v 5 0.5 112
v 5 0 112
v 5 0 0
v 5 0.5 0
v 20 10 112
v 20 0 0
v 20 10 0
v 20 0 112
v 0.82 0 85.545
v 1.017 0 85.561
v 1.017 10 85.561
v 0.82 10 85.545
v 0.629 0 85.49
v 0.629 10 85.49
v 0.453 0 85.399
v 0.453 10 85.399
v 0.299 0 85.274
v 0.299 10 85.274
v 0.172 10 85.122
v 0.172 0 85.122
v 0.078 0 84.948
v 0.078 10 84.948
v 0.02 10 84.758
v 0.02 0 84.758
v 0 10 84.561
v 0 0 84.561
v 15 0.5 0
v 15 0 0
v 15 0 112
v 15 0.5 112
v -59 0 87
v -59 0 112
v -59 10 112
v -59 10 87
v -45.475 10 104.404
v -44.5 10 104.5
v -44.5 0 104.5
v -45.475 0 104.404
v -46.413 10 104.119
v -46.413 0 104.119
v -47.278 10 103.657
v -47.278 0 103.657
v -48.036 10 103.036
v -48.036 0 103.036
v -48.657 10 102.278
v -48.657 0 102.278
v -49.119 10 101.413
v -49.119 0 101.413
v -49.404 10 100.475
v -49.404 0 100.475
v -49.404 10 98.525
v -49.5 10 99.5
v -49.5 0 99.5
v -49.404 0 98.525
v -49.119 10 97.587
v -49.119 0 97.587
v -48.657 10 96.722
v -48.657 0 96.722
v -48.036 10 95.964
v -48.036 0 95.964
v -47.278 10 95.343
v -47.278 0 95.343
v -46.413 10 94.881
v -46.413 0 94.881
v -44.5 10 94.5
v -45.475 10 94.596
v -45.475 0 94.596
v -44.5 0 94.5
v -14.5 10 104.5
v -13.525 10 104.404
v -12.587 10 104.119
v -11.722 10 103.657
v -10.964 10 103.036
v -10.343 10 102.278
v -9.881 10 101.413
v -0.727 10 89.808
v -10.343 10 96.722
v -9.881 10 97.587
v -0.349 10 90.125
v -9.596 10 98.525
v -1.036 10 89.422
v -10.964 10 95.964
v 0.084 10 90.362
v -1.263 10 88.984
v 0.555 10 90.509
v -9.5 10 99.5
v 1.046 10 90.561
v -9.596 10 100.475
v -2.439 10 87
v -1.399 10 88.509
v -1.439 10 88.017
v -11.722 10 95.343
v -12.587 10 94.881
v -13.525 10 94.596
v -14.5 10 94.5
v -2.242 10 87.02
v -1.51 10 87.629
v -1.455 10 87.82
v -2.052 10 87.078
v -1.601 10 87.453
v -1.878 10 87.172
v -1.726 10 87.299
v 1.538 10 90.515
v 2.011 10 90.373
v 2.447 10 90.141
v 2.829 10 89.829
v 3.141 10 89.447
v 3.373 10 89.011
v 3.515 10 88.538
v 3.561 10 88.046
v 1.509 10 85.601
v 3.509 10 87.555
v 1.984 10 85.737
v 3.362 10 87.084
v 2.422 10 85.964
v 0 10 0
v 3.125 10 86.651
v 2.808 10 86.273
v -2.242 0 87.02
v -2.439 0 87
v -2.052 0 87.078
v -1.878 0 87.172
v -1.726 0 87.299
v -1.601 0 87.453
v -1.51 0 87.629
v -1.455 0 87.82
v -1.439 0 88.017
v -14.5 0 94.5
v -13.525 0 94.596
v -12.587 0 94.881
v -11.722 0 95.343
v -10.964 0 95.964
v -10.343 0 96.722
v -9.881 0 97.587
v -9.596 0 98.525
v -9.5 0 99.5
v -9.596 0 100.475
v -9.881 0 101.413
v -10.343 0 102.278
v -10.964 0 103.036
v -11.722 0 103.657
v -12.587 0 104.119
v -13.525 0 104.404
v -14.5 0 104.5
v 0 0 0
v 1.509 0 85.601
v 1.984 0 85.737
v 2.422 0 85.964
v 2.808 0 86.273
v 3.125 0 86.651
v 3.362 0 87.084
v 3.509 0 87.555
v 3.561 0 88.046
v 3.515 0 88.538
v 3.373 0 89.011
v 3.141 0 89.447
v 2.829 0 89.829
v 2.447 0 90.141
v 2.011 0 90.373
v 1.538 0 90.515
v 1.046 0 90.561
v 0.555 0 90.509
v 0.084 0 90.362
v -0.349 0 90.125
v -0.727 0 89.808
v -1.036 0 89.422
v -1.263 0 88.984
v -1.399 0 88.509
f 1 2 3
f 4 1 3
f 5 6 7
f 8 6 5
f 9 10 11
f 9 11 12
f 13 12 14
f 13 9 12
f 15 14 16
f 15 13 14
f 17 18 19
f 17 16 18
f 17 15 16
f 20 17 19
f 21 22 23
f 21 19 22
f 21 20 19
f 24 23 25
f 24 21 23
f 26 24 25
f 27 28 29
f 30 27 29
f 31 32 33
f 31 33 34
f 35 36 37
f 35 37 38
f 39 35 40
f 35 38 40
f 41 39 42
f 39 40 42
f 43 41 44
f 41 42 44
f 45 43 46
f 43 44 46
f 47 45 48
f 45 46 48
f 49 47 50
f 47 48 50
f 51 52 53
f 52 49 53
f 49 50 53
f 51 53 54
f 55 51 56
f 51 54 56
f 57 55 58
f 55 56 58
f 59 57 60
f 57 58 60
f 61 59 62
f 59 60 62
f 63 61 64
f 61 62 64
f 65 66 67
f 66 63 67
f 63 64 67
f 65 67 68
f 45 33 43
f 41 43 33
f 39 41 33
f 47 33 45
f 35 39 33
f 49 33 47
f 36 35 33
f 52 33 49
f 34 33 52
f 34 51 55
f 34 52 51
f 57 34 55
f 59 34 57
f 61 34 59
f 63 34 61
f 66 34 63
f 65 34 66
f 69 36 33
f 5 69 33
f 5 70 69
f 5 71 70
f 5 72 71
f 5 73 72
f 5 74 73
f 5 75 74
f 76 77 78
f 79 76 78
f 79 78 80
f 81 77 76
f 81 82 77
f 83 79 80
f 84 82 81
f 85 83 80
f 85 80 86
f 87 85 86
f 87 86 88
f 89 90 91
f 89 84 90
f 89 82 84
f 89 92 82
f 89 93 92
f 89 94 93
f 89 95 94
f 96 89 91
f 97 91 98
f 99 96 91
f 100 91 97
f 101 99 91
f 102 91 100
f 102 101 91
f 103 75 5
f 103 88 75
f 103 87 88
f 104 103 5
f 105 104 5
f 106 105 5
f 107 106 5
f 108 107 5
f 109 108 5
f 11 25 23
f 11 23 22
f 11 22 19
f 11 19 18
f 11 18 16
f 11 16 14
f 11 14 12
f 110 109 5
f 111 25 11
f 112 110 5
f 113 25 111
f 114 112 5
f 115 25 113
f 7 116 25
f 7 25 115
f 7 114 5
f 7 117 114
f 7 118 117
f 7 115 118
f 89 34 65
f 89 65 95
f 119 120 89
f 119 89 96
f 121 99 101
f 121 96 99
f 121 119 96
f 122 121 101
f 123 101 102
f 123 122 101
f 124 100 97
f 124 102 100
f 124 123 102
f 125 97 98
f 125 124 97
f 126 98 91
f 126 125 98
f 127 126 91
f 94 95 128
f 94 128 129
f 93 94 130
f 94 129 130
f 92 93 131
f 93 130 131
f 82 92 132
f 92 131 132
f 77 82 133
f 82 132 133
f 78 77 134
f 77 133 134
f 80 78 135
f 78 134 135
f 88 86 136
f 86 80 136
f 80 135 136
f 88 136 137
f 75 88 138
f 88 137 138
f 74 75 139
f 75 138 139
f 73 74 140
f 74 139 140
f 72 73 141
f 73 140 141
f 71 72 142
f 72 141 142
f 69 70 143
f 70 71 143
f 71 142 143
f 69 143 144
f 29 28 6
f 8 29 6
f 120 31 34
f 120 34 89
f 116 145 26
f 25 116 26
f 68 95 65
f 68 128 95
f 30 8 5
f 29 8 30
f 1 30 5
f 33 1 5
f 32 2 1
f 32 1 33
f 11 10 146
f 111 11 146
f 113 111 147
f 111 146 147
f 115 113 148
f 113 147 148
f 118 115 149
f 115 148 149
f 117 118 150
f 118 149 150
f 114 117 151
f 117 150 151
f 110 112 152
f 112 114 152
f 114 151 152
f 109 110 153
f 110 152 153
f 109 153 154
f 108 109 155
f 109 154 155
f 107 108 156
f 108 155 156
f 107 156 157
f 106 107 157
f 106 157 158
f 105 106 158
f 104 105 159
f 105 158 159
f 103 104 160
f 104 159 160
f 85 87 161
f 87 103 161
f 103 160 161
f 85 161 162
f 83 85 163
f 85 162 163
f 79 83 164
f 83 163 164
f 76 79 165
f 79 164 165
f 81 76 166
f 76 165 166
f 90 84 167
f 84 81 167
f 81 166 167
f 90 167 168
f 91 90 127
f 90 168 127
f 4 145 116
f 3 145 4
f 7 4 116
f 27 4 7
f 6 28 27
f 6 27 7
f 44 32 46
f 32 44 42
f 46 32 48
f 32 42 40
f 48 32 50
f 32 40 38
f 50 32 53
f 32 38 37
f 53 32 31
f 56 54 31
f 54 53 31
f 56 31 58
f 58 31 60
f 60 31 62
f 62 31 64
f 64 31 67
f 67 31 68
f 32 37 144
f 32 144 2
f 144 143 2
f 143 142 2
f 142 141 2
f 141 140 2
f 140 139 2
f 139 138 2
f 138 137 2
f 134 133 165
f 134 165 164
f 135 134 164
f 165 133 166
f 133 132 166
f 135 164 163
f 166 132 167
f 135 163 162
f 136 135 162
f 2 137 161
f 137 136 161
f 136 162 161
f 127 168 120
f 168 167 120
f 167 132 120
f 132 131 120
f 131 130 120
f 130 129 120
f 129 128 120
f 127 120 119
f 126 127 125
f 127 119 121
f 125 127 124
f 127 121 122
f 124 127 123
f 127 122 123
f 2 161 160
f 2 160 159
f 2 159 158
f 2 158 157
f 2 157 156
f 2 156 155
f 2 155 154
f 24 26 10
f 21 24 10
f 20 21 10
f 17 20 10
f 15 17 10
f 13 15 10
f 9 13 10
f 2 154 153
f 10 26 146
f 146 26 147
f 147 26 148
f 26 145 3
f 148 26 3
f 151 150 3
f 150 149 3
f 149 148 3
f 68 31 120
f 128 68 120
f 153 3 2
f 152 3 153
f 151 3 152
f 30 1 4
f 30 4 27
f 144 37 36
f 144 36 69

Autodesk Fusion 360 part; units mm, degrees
sketch "Sketch1" plane through (0, 0, 0) normal (0, 1, 0) x (1, 0, 0)
  line L0 (0, 0) -> (20, 0)
  line L1 (20, 0) -> (20, -112)
  line L2 (20, -112) -> (-59, -112)
  line L3 (-59, -112) -> (-59, -87)
  line L4 (-59, -87) -> (-2.4388, -87)
  line L5 (0, 0) -> (0, -84.5612)
  line L6 (0, -87) -> (1.0607, -88.0607) construction
  line L7 (0, -87) -> (2, -87) construction
  arc A0 (-1.439, -88.0173) -> (1.0173, -85.561) centre (1.0607, -88.0607) ccw
  arc A1 (0, -84.5612) -> (1.0173, -85.561) centre (1, -84.5612) ccw
  arc A2 (-1.439, -88.0173) -> (-2.4388, -87) centre (-2.4388, -88) ccw
  line L8 (-59, -99.5) -> (-49.5, -99.5) construction
  line L9 (-27.9553, -112) -> (-27.9553, -104.5) construction
  line L10 (-27.9553, -87) -> (-27.9553, -94.5) construction
  line L11 (-14.5, -94.5) -> (-44.5, -94.5)
  line L12 (-44.5, -104.5) -> (-14.5, -104.5)
  arc A3 (-14.5, -104.5) -> (-14.5, -94.5) centre (-14.5, -99.5) ccw
  arc A4 (-44.5, -94.5) -> (-44.5, -104.5) centre (-44.5, -99.5) ccw
  point P0 (0, -85.7968)
  dimension "d1" = 20
  dimension "d2" = 112
  dimension "d3" = 79
  dimension "d5" = 59
  dimension "d8" = 45
  dimension "d9" = 1.5
  dimension "d10" = 5
  dimension "d11" = 25
  dimension "d12" = 85.7968
  dimension "d13" = 1
  dimension "d14" = 9.5
  dimension "d15" = 7.5
  dimension "d16" = 7.5
  dimension "d17" = 10
  dimension "d18" = 30
  dimension "d19" = 10
extrude "Extrude1" add sketch "Sketch1" along normal blind 10
sketch "Sketch3" plane through (0, 0, 0) normal (0, 1, 0) x (1, 0, 0)
  line L0 (0, 0) -> (5, 0) construction
  line L1 (5, 0) -> (15, 0)
  line L2 (15, 0) -> (15, -120)
  line L3 (15, -120) -> (5, -120)
  line L4 (5, -120) -> (5, 0)
  dimension "d26" = 5
  dimension "d27" = 10
  dimension "d28" = 120
extrude "Extrude2" cut sketch "Sketch3" along normal blind 0.5
